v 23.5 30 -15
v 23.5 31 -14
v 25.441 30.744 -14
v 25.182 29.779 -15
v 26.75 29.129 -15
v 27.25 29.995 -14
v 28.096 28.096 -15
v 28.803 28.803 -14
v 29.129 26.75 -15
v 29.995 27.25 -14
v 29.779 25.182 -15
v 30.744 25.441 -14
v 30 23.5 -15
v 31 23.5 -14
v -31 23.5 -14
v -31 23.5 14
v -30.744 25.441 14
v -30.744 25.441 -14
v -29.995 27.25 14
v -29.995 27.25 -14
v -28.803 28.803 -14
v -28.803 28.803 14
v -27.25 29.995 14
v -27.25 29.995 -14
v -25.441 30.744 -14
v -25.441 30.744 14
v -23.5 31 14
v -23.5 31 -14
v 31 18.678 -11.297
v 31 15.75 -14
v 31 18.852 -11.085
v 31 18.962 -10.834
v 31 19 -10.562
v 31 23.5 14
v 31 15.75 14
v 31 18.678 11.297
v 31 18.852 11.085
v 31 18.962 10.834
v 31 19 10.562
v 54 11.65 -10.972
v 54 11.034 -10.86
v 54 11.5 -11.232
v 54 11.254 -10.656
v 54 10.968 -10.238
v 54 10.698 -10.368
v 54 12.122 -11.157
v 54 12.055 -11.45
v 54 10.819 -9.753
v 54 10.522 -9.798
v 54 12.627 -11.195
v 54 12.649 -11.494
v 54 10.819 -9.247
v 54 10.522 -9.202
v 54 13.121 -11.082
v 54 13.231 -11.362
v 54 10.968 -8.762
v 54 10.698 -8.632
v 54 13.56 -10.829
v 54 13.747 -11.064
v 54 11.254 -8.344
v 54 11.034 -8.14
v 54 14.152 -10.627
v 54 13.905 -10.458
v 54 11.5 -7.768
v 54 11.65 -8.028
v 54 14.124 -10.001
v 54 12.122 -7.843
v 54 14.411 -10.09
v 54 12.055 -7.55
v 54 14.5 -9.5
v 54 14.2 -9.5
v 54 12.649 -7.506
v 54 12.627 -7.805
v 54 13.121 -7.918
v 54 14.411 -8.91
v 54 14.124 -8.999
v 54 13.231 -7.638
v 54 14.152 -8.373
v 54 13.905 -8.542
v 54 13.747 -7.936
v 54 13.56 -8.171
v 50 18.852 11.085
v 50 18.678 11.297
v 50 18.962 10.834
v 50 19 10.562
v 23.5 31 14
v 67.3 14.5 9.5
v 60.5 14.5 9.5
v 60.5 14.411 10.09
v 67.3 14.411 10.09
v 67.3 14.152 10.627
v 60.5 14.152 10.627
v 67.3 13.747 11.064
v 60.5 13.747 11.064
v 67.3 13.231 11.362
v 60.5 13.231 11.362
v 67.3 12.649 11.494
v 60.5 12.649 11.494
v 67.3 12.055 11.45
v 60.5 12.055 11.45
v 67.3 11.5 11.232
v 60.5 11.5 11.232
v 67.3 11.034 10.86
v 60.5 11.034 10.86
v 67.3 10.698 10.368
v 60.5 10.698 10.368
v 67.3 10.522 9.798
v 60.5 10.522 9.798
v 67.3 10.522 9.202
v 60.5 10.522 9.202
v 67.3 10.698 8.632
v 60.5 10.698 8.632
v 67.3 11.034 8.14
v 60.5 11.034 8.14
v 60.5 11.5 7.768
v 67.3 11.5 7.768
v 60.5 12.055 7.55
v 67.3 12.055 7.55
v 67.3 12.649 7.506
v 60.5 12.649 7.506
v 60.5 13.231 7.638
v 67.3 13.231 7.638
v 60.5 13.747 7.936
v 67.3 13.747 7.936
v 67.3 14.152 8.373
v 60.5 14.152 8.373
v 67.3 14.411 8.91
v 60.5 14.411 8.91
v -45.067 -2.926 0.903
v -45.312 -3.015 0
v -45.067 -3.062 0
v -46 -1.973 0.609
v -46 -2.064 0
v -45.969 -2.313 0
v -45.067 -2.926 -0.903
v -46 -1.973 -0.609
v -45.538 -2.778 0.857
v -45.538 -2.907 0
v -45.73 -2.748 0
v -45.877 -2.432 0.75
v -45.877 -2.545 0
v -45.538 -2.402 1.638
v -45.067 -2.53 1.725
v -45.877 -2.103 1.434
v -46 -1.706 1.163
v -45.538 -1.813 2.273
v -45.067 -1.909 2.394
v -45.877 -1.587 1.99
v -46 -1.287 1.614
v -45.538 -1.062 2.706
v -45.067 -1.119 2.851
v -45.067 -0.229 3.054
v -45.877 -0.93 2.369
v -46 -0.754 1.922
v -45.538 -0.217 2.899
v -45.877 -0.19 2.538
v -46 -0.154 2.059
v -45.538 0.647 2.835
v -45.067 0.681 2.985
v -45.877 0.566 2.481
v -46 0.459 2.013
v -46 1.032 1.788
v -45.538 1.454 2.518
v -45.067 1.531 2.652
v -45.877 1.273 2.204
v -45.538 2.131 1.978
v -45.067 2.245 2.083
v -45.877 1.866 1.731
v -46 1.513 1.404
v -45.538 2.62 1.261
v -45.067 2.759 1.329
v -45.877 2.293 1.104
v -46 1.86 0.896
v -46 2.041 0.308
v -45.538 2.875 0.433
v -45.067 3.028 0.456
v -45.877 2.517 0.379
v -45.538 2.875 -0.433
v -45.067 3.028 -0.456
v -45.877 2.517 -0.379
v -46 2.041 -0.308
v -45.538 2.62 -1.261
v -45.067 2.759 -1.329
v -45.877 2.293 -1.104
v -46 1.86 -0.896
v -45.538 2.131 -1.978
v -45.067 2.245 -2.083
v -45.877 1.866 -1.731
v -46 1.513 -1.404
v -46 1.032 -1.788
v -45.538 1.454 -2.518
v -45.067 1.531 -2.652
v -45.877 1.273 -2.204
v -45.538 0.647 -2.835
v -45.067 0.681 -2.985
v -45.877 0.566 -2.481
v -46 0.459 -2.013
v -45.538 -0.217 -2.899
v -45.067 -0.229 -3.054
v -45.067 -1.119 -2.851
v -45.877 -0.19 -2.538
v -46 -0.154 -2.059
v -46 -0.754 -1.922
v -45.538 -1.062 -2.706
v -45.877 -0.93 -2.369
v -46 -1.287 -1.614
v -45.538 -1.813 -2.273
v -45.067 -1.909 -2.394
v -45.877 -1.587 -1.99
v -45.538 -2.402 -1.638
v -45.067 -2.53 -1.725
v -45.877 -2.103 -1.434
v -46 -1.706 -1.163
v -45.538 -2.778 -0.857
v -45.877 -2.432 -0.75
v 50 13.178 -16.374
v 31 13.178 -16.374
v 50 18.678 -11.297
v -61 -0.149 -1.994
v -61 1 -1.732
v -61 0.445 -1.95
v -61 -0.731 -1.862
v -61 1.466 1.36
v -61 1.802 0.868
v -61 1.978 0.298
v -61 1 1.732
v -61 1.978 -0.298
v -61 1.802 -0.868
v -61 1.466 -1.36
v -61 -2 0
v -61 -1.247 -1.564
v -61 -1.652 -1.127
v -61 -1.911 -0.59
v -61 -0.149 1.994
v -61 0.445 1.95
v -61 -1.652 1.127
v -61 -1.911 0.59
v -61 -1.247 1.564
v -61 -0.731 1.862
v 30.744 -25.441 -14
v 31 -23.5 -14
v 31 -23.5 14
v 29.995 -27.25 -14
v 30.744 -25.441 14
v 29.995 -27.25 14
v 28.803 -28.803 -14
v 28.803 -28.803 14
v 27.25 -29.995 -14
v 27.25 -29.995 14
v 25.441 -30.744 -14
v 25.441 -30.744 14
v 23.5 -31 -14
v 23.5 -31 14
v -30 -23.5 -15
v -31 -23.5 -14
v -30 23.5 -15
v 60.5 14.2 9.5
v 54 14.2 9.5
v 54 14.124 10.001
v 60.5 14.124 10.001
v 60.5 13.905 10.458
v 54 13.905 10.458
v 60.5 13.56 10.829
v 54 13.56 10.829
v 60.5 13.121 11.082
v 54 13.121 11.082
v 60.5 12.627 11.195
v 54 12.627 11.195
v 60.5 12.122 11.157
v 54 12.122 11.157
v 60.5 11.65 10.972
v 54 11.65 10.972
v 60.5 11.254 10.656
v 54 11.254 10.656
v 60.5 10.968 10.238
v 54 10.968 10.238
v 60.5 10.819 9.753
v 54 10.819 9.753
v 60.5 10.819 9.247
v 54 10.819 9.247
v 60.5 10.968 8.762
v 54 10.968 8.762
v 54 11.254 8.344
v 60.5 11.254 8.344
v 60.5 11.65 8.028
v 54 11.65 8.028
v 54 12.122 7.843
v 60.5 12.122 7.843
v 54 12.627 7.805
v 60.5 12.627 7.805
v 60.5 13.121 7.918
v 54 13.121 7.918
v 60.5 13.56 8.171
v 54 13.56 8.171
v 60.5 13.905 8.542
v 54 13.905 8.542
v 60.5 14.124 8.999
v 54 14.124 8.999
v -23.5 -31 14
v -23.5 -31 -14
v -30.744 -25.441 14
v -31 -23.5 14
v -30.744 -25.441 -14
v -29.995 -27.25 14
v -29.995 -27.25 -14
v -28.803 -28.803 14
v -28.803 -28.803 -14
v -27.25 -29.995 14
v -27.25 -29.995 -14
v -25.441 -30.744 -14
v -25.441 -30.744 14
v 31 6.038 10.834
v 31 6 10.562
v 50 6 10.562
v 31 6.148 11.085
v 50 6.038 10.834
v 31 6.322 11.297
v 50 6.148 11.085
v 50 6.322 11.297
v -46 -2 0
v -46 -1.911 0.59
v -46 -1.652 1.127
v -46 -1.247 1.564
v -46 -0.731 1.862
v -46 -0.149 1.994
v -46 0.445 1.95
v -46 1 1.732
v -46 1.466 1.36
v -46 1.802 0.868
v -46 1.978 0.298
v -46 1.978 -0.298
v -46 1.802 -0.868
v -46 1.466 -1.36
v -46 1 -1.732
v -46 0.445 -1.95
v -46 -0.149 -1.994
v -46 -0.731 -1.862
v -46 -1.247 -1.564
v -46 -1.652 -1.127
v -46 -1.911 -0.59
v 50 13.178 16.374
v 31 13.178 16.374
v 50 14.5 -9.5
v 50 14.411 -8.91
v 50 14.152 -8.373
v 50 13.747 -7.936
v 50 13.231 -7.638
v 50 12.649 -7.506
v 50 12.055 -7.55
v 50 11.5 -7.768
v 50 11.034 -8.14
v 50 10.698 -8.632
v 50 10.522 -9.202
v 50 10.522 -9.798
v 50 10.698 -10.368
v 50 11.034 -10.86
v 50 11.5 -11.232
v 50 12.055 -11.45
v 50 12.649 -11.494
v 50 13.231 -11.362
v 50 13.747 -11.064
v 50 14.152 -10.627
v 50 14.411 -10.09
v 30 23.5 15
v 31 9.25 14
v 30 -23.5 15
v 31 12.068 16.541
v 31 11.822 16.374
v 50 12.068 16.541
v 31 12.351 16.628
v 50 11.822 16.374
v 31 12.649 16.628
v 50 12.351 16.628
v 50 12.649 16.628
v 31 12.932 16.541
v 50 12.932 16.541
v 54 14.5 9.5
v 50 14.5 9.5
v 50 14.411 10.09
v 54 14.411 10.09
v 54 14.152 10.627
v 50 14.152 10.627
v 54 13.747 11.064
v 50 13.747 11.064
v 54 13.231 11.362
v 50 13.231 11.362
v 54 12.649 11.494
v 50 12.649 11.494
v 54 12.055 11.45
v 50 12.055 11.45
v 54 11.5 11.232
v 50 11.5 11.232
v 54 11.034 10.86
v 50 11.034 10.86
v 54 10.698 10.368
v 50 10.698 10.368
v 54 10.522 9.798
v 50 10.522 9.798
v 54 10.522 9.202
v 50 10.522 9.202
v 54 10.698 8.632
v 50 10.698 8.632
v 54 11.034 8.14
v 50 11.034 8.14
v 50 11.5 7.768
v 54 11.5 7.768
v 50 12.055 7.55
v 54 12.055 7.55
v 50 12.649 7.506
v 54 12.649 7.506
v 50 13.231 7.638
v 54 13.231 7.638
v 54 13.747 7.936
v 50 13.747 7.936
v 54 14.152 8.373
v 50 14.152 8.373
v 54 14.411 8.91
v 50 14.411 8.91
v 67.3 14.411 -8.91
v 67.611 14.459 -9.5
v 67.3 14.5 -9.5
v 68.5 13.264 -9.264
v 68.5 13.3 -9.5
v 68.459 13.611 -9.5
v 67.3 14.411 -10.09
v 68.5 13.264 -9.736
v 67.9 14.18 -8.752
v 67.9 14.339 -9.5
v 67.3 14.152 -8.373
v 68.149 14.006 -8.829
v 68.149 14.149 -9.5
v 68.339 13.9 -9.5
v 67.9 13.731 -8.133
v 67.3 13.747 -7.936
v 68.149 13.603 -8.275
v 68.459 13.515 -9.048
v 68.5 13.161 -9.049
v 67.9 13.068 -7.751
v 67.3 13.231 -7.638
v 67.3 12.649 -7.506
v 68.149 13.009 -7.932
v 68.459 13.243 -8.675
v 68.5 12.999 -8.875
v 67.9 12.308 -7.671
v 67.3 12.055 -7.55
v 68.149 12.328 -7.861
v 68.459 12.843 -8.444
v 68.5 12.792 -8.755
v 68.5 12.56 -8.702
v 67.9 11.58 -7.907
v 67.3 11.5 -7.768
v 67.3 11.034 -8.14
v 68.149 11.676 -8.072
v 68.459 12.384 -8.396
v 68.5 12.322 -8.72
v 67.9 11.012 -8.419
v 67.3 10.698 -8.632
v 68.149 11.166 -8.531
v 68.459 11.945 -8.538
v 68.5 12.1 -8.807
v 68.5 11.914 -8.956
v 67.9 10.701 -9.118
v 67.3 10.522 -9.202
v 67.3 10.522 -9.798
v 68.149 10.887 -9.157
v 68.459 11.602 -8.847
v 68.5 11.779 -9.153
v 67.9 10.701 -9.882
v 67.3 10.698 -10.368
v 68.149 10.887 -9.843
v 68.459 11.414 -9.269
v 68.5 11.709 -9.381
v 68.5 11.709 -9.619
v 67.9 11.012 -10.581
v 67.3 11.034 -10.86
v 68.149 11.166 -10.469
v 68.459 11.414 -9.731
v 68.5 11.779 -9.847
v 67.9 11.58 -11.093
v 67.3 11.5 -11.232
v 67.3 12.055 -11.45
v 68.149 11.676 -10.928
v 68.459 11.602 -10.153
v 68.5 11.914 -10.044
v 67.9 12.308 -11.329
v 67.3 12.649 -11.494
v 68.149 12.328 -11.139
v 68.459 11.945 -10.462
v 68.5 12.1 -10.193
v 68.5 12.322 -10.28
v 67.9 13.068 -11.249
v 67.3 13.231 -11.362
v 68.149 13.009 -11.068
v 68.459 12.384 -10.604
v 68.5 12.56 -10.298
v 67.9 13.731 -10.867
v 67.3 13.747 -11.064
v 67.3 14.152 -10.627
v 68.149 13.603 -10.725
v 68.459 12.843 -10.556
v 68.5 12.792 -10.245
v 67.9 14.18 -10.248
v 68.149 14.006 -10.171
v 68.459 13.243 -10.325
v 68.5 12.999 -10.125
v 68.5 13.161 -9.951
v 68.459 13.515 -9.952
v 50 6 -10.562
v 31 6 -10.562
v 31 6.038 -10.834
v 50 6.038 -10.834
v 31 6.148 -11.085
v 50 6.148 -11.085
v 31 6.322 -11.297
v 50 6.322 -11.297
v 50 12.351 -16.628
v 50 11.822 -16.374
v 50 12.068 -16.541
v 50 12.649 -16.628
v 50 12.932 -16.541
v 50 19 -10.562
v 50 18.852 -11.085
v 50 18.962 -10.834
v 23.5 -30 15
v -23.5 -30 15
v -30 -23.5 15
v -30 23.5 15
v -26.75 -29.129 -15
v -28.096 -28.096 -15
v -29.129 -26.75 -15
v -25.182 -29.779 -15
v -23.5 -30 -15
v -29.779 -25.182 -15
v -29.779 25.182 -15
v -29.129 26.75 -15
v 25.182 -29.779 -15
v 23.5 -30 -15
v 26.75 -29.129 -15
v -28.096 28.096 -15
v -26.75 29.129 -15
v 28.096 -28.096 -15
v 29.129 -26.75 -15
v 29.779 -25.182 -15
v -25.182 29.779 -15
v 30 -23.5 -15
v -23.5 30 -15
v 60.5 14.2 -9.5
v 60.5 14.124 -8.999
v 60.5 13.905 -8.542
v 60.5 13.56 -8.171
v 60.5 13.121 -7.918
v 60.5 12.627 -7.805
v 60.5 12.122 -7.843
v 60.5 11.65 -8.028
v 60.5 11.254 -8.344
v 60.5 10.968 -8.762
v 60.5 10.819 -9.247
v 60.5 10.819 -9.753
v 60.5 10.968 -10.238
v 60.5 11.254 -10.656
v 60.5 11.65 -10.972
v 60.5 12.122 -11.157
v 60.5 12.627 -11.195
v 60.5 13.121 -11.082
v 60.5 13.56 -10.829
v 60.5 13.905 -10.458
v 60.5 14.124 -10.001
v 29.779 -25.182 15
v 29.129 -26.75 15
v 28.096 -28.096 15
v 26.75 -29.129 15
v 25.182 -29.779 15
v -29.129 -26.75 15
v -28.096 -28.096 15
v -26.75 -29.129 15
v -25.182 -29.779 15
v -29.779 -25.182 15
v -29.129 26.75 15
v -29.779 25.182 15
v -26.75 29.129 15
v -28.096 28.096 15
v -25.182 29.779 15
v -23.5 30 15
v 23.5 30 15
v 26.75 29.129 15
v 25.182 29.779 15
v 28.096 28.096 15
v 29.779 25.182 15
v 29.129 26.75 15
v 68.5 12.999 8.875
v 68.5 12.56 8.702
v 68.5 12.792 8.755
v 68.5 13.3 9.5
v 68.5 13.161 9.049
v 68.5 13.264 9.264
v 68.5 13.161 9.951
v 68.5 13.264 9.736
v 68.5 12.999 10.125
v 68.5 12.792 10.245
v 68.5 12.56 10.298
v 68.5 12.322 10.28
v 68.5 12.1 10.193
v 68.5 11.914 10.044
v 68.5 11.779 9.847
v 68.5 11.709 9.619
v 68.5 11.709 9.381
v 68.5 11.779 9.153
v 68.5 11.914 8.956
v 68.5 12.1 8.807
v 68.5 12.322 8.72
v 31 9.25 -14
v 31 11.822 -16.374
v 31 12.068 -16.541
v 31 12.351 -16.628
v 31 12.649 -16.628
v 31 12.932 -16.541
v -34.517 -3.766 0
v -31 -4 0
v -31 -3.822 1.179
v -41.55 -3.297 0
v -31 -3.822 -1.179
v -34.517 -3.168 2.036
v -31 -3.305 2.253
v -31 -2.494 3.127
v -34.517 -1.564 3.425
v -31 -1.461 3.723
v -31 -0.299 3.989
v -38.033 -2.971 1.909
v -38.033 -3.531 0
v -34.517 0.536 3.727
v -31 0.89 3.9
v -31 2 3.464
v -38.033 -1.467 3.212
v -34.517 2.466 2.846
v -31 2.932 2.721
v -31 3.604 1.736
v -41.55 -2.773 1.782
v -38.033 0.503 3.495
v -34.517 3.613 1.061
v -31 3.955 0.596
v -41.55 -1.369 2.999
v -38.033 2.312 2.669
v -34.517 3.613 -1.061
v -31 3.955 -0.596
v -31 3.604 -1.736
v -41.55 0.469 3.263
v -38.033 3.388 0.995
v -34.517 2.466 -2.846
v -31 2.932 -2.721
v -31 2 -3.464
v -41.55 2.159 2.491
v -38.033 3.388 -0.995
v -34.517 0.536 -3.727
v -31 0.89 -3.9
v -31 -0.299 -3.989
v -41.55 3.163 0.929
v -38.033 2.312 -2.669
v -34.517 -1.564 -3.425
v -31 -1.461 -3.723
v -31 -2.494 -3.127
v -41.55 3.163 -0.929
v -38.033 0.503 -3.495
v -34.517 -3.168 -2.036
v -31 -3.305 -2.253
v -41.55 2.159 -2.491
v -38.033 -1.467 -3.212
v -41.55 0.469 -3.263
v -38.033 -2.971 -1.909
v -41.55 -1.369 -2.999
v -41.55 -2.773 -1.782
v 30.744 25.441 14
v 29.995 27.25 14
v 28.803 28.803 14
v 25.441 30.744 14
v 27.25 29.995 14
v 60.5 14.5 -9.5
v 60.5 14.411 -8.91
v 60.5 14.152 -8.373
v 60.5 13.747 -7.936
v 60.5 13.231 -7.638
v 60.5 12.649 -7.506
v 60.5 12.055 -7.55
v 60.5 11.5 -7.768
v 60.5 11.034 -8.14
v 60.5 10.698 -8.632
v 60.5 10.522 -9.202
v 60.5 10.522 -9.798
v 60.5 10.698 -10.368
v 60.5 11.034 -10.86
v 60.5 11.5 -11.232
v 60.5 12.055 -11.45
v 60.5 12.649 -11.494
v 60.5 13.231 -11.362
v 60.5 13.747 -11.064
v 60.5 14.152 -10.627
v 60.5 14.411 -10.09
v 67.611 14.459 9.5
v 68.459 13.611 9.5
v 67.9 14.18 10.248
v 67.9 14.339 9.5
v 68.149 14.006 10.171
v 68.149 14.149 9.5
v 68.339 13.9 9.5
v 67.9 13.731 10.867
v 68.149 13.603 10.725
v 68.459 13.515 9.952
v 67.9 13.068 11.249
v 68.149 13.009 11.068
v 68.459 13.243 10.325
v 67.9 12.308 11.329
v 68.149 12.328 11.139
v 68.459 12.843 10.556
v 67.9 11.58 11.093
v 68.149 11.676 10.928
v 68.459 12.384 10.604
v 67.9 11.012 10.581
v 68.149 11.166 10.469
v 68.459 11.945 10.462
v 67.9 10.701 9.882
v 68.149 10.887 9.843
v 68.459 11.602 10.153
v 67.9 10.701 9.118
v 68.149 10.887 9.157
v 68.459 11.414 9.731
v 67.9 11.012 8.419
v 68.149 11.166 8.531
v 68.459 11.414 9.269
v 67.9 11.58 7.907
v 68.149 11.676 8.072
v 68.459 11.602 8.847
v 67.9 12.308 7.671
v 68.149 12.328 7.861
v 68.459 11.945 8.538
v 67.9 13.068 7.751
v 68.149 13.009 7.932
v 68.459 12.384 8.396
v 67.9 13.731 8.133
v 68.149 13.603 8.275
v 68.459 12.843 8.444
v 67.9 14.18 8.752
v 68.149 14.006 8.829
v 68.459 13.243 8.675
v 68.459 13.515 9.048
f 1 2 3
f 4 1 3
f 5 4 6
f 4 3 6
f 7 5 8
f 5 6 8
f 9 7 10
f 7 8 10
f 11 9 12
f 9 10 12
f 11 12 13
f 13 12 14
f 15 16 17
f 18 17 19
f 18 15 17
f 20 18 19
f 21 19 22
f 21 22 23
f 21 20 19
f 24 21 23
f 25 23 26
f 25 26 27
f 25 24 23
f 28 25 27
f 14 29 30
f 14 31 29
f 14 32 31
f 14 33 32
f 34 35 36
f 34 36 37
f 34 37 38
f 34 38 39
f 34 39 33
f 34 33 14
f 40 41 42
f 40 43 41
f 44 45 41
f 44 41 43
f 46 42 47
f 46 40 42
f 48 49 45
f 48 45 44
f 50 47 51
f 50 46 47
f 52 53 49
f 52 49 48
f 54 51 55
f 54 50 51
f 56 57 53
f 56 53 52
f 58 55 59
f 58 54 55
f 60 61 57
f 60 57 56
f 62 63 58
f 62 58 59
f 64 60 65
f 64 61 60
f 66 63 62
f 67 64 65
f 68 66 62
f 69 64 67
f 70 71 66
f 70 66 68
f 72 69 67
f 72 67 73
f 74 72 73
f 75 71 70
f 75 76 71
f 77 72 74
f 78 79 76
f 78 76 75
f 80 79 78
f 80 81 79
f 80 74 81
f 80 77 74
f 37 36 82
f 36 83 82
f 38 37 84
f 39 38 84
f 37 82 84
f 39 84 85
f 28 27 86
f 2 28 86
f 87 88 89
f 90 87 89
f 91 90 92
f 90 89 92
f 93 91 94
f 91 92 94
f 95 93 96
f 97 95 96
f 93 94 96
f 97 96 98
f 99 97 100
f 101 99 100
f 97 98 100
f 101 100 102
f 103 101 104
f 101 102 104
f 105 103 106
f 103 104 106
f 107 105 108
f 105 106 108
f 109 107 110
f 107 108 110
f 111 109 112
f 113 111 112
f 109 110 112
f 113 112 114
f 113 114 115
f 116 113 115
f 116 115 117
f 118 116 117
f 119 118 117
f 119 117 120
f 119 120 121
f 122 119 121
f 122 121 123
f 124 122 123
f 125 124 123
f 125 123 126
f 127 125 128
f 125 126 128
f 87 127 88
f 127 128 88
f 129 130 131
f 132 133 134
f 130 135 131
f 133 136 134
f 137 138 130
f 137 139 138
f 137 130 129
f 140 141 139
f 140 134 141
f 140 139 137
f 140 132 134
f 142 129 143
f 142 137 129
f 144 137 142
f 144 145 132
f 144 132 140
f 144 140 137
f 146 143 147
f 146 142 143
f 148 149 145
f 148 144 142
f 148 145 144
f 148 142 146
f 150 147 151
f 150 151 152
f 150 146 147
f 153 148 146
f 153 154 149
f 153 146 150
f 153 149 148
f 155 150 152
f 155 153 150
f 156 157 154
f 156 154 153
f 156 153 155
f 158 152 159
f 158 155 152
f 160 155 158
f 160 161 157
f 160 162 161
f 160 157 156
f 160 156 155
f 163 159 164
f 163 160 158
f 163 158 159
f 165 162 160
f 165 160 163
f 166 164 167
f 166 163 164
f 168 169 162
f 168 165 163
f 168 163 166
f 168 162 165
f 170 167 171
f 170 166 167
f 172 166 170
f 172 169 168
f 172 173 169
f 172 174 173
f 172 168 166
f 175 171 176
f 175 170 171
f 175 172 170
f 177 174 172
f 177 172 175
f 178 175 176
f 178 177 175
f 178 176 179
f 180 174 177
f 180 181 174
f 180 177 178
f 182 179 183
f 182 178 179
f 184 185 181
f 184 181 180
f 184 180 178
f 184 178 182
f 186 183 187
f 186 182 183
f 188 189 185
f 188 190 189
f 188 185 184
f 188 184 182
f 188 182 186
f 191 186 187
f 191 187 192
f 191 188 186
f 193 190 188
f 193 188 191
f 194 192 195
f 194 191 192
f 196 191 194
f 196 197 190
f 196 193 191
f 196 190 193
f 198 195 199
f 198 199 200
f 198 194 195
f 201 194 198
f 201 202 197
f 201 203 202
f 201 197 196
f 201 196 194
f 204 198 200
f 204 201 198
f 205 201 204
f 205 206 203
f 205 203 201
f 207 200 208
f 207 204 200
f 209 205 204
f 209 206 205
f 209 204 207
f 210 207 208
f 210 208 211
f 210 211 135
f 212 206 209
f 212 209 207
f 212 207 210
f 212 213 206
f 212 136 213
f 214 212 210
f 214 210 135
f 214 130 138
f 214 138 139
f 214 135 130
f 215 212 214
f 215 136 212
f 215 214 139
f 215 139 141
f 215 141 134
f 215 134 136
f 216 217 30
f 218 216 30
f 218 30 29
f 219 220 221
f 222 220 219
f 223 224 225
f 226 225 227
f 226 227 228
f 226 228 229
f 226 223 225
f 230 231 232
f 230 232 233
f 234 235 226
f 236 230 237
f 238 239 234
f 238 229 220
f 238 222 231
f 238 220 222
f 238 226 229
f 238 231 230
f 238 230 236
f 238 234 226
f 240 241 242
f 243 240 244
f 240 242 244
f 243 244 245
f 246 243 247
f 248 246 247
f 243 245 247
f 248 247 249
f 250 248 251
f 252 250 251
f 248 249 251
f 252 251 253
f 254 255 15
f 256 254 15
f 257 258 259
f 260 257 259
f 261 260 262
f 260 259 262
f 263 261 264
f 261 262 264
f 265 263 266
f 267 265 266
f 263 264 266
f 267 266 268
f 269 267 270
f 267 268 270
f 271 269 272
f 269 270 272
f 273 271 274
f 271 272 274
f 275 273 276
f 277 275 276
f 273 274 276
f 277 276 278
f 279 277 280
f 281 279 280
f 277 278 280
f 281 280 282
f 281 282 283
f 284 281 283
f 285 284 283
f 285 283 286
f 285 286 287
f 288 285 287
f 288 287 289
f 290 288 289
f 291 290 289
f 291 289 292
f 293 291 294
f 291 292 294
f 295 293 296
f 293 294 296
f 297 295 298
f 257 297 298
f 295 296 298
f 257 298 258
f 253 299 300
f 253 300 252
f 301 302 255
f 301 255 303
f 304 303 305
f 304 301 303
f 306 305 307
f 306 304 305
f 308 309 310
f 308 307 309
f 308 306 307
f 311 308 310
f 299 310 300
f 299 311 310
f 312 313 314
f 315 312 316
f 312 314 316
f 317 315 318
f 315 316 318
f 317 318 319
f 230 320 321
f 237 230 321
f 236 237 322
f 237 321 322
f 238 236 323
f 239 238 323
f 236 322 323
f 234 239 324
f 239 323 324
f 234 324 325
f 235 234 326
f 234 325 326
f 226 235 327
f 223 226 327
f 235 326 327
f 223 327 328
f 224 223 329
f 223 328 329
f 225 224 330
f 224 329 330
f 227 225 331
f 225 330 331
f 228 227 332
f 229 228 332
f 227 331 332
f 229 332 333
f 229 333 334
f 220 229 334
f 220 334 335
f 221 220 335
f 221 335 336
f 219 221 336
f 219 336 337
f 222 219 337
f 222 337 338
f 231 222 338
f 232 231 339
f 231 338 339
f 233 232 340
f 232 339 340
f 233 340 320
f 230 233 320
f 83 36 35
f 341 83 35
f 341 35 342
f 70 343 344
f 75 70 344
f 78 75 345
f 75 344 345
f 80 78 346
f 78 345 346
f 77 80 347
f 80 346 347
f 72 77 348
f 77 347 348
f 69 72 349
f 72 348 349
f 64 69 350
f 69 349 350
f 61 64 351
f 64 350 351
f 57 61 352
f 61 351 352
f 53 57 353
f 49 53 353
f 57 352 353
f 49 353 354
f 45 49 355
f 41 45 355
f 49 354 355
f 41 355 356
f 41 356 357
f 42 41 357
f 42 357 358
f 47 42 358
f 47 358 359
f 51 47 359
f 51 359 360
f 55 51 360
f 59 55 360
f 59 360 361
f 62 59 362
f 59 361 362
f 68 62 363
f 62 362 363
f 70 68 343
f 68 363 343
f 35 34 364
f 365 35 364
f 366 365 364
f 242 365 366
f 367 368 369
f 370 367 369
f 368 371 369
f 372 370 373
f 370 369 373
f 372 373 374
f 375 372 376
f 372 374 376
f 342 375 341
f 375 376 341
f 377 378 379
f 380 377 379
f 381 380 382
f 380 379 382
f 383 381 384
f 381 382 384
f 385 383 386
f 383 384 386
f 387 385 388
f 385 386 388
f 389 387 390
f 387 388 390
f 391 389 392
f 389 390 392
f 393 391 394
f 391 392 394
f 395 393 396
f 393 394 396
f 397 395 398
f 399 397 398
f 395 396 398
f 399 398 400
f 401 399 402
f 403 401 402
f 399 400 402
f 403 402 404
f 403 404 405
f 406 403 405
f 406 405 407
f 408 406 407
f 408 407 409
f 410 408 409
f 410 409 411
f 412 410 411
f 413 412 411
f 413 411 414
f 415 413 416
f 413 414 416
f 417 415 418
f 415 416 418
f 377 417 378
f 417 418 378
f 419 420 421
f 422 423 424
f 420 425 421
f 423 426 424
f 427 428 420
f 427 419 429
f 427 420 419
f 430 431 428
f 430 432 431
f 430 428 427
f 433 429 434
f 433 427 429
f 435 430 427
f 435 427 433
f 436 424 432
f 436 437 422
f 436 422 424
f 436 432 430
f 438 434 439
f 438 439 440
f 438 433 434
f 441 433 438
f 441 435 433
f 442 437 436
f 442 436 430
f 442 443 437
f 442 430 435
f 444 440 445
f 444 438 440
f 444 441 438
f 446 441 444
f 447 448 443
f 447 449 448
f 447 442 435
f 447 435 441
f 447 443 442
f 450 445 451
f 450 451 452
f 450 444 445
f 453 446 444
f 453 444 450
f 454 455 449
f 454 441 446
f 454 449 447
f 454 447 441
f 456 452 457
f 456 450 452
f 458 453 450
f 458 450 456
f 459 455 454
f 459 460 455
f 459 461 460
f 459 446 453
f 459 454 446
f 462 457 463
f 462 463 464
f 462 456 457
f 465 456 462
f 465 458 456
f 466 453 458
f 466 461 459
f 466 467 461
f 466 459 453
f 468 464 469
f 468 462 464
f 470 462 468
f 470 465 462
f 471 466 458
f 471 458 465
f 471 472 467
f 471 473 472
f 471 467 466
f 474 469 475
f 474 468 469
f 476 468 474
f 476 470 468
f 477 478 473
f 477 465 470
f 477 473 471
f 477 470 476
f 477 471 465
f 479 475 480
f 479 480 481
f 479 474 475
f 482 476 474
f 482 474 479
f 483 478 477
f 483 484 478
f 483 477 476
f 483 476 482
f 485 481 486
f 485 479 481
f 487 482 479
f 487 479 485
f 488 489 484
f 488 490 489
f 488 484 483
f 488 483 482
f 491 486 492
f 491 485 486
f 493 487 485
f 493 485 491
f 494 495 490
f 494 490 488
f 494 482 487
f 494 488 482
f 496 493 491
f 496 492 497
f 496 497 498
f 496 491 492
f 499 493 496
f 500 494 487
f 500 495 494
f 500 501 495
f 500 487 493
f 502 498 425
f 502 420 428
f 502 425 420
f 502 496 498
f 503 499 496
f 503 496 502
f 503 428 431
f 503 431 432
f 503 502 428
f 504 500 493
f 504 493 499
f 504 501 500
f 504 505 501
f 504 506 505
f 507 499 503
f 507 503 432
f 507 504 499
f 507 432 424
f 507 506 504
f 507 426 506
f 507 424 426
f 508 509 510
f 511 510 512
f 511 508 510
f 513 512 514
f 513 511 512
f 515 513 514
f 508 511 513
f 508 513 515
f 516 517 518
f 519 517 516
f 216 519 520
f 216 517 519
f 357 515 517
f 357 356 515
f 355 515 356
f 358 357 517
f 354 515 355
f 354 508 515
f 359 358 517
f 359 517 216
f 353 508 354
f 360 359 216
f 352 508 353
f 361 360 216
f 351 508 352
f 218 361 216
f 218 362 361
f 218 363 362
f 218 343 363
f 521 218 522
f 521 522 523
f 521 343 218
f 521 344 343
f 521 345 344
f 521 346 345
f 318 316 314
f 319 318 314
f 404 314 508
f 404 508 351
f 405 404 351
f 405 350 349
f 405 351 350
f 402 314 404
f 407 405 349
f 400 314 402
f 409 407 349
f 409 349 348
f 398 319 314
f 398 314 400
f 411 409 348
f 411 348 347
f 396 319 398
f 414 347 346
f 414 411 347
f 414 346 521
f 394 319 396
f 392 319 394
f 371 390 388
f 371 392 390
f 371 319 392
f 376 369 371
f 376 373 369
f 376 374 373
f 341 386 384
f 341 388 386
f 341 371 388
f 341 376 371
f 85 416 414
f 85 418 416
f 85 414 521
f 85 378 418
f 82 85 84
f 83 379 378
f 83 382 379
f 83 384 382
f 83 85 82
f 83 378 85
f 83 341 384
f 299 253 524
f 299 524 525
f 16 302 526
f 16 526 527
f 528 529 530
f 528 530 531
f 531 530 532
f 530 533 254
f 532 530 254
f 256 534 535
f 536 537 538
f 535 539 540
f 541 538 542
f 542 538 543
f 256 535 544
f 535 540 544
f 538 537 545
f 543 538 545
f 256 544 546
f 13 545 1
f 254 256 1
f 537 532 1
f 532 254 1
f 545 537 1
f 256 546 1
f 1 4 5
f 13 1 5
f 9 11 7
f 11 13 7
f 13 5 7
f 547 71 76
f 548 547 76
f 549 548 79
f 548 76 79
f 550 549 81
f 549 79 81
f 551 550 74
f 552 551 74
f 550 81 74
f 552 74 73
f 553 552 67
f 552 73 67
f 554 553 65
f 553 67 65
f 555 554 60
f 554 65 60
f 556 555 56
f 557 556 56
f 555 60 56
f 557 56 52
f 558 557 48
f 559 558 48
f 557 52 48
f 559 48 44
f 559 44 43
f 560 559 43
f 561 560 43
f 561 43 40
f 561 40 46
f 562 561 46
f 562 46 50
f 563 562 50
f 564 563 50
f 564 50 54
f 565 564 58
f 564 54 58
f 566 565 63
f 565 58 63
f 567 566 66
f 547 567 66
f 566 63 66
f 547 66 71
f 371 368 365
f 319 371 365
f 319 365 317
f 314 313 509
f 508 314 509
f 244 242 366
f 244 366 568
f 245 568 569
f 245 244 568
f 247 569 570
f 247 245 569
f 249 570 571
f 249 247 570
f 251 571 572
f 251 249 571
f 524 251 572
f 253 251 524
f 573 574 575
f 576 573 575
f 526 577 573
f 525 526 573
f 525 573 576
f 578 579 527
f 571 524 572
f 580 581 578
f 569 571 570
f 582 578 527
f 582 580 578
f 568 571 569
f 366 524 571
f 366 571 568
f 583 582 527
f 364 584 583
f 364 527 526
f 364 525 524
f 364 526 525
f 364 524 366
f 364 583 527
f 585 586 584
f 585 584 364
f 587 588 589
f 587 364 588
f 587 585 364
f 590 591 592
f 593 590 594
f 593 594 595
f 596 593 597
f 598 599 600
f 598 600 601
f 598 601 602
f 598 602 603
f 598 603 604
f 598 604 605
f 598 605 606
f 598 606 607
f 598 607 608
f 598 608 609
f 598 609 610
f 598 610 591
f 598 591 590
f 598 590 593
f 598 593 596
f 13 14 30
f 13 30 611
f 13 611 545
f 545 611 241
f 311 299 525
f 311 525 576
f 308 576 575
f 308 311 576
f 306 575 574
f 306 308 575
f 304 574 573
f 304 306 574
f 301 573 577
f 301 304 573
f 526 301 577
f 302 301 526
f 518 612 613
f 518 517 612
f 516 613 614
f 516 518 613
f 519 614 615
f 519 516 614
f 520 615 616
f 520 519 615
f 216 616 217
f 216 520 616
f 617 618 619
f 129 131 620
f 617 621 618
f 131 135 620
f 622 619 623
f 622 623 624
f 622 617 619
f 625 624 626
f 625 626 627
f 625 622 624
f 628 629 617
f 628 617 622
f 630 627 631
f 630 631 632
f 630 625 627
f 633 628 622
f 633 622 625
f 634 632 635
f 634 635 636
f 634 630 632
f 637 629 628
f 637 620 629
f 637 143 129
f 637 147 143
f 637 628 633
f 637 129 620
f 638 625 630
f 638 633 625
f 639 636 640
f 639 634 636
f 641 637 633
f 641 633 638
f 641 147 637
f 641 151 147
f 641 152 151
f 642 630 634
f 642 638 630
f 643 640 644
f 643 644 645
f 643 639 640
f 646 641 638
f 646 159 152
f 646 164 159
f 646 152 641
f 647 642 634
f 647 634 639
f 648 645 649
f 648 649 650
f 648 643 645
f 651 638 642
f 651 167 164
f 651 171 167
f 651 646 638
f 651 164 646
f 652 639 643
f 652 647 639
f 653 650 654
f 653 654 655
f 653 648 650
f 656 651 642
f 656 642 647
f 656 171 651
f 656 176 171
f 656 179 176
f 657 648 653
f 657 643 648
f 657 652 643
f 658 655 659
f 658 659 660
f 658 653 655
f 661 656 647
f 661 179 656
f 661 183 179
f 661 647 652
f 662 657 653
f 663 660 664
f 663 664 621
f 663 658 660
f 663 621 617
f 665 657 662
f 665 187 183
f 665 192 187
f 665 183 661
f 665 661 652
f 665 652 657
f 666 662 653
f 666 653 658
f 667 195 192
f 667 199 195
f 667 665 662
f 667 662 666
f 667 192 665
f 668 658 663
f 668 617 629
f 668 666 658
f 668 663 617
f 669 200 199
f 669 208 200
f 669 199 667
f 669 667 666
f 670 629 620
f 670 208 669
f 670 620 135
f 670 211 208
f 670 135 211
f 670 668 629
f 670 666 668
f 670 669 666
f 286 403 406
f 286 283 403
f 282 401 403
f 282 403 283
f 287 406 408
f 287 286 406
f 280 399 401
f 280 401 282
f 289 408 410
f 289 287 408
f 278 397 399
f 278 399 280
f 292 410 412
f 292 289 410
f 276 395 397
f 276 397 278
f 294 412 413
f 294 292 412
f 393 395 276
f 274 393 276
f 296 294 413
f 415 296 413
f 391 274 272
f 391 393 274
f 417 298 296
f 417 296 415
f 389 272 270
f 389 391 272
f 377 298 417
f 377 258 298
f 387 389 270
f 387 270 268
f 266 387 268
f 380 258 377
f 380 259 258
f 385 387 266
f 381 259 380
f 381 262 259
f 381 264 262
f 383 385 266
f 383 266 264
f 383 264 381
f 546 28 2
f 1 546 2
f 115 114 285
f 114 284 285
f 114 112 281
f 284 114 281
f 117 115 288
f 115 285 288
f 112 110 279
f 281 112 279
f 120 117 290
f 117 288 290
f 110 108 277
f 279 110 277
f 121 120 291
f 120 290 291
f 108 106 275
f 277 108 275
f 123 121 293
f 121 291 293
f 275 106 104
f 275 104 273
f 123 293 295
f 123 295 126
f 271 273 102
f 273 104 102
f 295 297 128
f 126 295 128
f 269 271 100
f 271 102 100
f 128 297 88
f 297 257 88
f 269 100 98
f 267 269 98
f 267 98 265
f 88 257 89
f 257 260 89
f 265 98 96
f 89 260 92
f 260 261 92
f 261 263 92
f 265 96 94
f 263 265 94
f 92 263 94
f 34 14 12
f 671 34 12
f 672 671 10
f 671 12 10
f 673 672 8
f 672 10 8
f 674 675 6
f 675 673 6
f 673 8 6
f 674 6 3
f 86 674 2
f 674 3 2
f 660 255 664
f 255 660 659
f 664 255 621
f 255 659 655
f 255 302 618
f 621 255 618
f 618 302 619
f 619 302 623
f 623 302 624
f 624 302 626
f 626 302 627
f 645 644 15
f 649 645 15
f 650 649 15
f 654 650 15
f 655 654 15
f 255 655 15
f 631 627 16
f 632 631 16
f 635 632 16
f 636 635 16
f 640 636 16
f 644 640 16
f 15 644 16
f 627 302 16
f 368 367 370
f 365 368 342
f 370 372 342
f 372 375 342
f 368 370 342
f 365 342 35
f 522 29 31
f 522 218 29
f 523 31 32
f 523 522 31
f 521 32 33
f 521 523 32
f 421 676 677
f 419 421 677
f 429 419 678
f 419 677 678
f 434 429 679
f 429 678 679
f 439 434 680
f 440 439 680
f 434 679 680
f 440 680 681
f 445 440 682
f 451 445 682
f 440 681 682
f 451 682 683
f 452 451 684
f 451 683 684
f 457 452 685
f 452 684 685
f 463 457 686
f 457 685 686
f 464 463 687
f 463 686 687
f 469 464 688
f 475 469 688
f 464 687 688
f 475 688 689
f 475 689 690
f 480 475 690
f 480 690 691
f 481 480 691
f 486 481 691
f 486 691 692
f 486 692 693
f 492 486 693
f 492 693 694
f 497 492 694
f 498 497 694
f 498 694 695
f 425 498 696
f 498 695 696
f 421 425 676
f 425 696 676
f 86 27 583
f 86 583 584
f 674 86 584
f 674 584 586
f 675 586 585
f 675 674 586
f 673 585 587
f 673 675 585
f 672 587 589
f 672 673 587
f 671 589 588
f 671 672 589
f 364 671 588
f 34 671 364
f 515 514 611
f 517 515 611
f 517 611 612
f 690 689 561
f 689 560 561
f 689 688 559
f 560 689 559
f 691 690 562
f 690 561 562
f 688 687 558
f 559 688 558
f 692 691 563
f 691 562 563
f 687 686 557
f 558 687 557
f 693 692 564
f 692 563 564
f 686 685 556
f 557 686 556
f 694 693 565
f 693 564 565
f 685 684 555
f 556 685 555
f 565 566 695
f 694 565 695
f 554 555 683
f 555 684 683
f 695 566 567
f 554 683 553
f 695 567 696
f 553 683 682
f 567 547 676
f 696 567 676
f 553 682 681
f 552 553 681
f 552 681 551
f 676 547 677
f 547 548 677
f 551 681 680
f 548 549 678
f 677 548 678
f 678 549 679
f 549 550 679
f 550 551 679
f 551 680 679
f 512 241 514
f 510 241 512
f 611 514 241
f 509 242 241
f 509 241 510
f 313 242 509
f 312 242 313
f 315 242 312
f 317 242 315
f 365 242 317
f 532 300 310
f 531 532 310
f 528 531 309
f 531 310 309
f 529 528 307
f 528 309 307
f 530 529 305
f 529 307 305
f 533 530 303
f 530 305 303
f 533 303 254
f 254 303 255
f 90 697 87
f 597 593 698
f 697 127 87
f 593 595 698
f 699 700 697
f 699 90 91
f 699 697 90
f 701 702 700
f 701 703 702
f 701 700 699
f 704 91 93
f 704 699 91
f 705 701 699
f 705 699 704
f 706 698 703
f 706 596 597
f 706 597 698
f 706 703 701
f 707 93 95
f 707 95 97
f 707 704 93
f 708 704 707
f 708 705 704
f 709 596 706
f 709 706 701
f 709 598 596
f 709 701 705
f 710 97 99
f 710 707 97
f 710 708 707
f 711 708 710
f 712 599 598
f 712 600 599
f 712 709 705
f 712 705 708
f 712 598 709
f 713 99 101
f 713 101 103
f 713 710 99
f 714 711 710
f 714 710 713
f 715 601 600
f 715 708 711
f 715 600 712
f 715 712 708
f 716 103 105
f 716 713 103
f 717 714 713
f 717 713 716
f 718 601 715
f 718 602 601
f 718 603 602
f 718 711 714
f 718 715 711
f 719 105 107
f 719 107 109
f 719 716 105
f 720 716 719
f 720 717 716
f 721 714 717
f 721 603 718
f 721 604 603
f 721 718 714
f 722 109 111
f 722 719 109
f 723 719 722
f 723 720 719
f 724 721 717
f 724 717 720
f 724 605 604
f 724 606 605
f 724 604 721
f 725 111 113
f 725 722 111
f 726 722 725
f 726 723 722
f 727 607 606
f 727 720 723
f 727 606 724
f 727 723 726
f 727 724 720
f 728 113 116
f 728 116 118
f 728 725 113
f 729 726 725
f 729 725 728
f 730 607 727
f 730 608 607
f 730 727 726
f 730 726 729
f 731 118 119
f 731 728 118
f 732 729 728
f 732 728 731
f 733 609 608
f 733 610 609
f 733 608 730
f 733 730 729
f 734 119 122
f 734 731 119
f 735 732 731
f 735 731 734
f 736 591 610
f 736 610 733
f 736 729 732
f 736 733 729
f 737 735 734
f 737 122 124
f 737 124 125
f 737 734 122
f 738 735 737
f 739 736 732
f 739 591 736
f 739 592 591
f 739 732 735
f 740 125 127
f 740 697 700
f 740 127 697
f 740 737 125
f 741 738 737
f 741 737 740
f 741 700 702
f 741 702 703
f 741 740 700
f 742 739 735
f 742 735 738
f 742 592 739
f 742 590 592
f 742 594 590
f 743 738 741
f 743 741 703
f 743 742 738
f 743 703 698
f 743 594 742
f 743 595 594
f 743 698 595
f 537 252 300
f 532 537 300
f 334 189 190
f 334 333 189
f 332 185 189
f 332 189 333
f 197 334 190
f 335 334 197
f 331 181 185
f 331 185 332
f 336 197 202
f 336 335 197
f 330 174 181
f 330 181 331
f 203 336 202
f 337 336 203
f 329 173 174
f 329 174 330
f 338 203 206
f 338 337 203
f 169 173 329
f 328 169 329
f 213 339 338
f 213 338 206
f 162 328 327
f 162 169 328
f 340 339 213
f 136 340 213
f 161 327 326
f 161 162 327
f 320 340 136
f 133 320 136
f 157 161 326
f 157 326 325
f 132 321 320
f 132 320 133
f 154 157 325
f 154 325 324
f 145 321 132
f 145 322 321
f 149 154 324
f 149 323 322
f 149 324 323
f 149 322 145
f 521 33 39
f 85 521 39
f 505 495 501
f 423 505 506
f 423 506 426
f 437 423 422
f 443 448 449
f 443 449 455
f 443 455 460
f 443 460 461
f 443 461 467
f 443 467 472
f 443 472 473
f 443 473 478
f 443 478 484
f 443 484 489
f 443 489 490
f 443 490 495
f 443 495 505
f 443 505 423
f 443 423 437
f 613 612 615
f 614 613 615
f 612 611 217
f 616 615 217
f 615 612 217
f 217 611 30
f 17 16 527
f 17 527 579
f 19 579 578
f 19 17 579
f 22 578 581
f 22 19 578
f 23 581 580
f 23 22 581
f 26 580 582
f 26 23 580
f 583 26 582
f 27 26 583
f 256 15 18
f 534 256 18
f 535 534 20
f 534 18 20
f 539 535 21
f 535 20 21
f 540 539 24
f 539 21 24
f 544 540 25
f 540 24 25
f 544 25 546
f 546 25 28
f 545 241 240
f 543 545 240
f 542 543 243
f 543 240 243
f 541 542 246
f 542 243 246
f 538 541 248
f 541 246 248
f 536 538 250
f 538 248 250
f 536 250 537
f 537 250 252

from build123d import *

# Parameters (mm, degrees)
SKETCH_W     = 62
SKETCH_H     = 62
PAD_DEPTH    = 15
FILLET_R     = 7.5
CHAMFER_SIZE = 1
PAD001_DEPTH = 19
FILLET001_R  = 1
SKETCH002_R  = 2
PAD002_DEPTH = 4
SKETCH003_R  = 1.7
PAD003_DEPTH = 6.5
SKETCH004_R  = 2
PAD004_DEPTH = 8
FILLET002_R  = 1.2
FILLET003_R  = 1.2
FILLET004_R  = 1
SKETCH005_R  = 2
PAD005_DEPTH = 15


with BuildPart() as part:
    # Sketch → Pad (new body, symmetric)
    with BuildSketch(Plane.XY):
        Rectangle(SKETCH_W, SKETCH_H)
    extrude(amount=PAD_DEPTH, both=True)

    # Fillet
    fillet_edges = [part.edges().sort_by_distance(p)[0] for p in [
        (31, -31, 0),
        (-31, -31, 0),
        (31, 31, 0),
        (-31, 31, 0),
    ]]
    fillet(fillet_edges, radius=FILLET_R)

    # Chamfer
    chamfer_edges = [part.edges().sort_by_distance(p)[0] for p in [
        (0, 31, 15),
        (-28.803301, 28.803301, 15),
        (-31, 0, 15),
        (31, 0, 15),
        (28.803301, 28.803301, 15),
        (-28.803301, -28.803301, 15),
        (0, -31, 15),
        (28.803301, -28.803301, 15),
        (28.803301, -28.803301, -15),
        (0, -31, -15),
        (-28.803301, -28.803301, -15),
        (-31, 0, -15),
        (31, 0, -15),
        (28.803301, 28.803301, -15),
        (0, 31, -15),
        (-28.803301, 28.803301, -15),
    ]]
    chamfer(chamfer_edges, length=CHAMFER_SIZE)

    # Sketch001 (on Face13 of Chamfer) → Pad001 (join)
    with BuildSketch(Plane.YZ.offset(31)):
        Polygon((6, 11), (6, -11), (12.5, -17), (19, -11), (19, 11), (12.5, 17), align=None)
    extrude(amount=PAD001_DEPTH)

    # Fillet001
    fillet001_edges = [part.edges().sort_by_distance(p)[0] for p in [
        (40.5, 19, 11),
        (40.5, 6, 11),
        (40.5, 12.5, 17),
        (40.5, 6, -11),
        (40.5, 12.5, -17),
        (40.5, 19, -11),
    ]]
    fillet(fillet001_edges, radius=FILLET001_R)

    # Sketch002 (on Face12 of Fillet001) → Pad002 (join)
    with BuildSketch(Plane.YZ.offset(50)):
        with Locations((12.5, 9.5)):
            Circle(SKETCH002_R)
        with Locations((12.5, -9.5)):
            Circle(SKETCH002_R)
    extrude(amount=PAD002_DEPTH)

    # Sketch003 (on Face43 of Pad002) → Pad003 (join)
    with BuildSketch(Plane.YZ.offset(54)):
        with Locations((12.5, 9.5)):
            Circle(SKETCH003_R)
        with Locations((12.5, -9.5)):
            Circle(SKETCH003_R)
    extrude(amount=PAD003_DEPTH)

    # Sketch004 (on Face50 of Pad003) → Pad004 (join)
    with BuildSketch(Plane.YZ.offset(60.5)):
        with Locations((12.5, 9.5)):
            Circle(SKETCH004_R)
        with Locations((12.5, -9.5)):
            Circle(SKETCH004_R)
    extrude(amount=PAD004_DEPTH)

    # Fillet002
    fillet002_edges = [part.edges().sort_by_distance(p)[0] for p in [
        (68.5, 10.5, 9.5),
    ]]
    fillet(fillet002_edges, radius=FILLET002_R)

    # Fillet003
    fillet003_edges = [part.edges().sort_by_distance(p)[0] for p in [
        (68.5, 10.5, -9.5),
    ]]
    fillet(fillet003_edges, radius=FILLET003_R)

    # Cone → Cone (revolve)
    with BuildSketch(Plane(origin=(-31, 0, 0), x_dir=(0, -1, 0), z_dir=(0, 0, -1))):
        Polygon((0, 0), (4, 0), (3, 15), (0, 15), align=None)
    revolve(axis=Axis((-31, 0, 0), (-1, 0, 0)))

    # Fillet004
    fillet004_edges = [part.edges().sort_by_distance(p)[0] for p in [
        (-46, 3, 0),
    ]]
    fillet(fillet004_edges, radius=FILLET004_R)

    # Sketch005 (on Face4 of Fillet004) → Pad005 (join)
    with BuildSketch(Plane(origin=(-46, 0, 0), x_dir=(0, -1, 0), z_dir=(-1, 0, 0))):
        Circle(SKETCH005_R)
    extrude(amount=PAD005_DEPTH)


solid = part.part
